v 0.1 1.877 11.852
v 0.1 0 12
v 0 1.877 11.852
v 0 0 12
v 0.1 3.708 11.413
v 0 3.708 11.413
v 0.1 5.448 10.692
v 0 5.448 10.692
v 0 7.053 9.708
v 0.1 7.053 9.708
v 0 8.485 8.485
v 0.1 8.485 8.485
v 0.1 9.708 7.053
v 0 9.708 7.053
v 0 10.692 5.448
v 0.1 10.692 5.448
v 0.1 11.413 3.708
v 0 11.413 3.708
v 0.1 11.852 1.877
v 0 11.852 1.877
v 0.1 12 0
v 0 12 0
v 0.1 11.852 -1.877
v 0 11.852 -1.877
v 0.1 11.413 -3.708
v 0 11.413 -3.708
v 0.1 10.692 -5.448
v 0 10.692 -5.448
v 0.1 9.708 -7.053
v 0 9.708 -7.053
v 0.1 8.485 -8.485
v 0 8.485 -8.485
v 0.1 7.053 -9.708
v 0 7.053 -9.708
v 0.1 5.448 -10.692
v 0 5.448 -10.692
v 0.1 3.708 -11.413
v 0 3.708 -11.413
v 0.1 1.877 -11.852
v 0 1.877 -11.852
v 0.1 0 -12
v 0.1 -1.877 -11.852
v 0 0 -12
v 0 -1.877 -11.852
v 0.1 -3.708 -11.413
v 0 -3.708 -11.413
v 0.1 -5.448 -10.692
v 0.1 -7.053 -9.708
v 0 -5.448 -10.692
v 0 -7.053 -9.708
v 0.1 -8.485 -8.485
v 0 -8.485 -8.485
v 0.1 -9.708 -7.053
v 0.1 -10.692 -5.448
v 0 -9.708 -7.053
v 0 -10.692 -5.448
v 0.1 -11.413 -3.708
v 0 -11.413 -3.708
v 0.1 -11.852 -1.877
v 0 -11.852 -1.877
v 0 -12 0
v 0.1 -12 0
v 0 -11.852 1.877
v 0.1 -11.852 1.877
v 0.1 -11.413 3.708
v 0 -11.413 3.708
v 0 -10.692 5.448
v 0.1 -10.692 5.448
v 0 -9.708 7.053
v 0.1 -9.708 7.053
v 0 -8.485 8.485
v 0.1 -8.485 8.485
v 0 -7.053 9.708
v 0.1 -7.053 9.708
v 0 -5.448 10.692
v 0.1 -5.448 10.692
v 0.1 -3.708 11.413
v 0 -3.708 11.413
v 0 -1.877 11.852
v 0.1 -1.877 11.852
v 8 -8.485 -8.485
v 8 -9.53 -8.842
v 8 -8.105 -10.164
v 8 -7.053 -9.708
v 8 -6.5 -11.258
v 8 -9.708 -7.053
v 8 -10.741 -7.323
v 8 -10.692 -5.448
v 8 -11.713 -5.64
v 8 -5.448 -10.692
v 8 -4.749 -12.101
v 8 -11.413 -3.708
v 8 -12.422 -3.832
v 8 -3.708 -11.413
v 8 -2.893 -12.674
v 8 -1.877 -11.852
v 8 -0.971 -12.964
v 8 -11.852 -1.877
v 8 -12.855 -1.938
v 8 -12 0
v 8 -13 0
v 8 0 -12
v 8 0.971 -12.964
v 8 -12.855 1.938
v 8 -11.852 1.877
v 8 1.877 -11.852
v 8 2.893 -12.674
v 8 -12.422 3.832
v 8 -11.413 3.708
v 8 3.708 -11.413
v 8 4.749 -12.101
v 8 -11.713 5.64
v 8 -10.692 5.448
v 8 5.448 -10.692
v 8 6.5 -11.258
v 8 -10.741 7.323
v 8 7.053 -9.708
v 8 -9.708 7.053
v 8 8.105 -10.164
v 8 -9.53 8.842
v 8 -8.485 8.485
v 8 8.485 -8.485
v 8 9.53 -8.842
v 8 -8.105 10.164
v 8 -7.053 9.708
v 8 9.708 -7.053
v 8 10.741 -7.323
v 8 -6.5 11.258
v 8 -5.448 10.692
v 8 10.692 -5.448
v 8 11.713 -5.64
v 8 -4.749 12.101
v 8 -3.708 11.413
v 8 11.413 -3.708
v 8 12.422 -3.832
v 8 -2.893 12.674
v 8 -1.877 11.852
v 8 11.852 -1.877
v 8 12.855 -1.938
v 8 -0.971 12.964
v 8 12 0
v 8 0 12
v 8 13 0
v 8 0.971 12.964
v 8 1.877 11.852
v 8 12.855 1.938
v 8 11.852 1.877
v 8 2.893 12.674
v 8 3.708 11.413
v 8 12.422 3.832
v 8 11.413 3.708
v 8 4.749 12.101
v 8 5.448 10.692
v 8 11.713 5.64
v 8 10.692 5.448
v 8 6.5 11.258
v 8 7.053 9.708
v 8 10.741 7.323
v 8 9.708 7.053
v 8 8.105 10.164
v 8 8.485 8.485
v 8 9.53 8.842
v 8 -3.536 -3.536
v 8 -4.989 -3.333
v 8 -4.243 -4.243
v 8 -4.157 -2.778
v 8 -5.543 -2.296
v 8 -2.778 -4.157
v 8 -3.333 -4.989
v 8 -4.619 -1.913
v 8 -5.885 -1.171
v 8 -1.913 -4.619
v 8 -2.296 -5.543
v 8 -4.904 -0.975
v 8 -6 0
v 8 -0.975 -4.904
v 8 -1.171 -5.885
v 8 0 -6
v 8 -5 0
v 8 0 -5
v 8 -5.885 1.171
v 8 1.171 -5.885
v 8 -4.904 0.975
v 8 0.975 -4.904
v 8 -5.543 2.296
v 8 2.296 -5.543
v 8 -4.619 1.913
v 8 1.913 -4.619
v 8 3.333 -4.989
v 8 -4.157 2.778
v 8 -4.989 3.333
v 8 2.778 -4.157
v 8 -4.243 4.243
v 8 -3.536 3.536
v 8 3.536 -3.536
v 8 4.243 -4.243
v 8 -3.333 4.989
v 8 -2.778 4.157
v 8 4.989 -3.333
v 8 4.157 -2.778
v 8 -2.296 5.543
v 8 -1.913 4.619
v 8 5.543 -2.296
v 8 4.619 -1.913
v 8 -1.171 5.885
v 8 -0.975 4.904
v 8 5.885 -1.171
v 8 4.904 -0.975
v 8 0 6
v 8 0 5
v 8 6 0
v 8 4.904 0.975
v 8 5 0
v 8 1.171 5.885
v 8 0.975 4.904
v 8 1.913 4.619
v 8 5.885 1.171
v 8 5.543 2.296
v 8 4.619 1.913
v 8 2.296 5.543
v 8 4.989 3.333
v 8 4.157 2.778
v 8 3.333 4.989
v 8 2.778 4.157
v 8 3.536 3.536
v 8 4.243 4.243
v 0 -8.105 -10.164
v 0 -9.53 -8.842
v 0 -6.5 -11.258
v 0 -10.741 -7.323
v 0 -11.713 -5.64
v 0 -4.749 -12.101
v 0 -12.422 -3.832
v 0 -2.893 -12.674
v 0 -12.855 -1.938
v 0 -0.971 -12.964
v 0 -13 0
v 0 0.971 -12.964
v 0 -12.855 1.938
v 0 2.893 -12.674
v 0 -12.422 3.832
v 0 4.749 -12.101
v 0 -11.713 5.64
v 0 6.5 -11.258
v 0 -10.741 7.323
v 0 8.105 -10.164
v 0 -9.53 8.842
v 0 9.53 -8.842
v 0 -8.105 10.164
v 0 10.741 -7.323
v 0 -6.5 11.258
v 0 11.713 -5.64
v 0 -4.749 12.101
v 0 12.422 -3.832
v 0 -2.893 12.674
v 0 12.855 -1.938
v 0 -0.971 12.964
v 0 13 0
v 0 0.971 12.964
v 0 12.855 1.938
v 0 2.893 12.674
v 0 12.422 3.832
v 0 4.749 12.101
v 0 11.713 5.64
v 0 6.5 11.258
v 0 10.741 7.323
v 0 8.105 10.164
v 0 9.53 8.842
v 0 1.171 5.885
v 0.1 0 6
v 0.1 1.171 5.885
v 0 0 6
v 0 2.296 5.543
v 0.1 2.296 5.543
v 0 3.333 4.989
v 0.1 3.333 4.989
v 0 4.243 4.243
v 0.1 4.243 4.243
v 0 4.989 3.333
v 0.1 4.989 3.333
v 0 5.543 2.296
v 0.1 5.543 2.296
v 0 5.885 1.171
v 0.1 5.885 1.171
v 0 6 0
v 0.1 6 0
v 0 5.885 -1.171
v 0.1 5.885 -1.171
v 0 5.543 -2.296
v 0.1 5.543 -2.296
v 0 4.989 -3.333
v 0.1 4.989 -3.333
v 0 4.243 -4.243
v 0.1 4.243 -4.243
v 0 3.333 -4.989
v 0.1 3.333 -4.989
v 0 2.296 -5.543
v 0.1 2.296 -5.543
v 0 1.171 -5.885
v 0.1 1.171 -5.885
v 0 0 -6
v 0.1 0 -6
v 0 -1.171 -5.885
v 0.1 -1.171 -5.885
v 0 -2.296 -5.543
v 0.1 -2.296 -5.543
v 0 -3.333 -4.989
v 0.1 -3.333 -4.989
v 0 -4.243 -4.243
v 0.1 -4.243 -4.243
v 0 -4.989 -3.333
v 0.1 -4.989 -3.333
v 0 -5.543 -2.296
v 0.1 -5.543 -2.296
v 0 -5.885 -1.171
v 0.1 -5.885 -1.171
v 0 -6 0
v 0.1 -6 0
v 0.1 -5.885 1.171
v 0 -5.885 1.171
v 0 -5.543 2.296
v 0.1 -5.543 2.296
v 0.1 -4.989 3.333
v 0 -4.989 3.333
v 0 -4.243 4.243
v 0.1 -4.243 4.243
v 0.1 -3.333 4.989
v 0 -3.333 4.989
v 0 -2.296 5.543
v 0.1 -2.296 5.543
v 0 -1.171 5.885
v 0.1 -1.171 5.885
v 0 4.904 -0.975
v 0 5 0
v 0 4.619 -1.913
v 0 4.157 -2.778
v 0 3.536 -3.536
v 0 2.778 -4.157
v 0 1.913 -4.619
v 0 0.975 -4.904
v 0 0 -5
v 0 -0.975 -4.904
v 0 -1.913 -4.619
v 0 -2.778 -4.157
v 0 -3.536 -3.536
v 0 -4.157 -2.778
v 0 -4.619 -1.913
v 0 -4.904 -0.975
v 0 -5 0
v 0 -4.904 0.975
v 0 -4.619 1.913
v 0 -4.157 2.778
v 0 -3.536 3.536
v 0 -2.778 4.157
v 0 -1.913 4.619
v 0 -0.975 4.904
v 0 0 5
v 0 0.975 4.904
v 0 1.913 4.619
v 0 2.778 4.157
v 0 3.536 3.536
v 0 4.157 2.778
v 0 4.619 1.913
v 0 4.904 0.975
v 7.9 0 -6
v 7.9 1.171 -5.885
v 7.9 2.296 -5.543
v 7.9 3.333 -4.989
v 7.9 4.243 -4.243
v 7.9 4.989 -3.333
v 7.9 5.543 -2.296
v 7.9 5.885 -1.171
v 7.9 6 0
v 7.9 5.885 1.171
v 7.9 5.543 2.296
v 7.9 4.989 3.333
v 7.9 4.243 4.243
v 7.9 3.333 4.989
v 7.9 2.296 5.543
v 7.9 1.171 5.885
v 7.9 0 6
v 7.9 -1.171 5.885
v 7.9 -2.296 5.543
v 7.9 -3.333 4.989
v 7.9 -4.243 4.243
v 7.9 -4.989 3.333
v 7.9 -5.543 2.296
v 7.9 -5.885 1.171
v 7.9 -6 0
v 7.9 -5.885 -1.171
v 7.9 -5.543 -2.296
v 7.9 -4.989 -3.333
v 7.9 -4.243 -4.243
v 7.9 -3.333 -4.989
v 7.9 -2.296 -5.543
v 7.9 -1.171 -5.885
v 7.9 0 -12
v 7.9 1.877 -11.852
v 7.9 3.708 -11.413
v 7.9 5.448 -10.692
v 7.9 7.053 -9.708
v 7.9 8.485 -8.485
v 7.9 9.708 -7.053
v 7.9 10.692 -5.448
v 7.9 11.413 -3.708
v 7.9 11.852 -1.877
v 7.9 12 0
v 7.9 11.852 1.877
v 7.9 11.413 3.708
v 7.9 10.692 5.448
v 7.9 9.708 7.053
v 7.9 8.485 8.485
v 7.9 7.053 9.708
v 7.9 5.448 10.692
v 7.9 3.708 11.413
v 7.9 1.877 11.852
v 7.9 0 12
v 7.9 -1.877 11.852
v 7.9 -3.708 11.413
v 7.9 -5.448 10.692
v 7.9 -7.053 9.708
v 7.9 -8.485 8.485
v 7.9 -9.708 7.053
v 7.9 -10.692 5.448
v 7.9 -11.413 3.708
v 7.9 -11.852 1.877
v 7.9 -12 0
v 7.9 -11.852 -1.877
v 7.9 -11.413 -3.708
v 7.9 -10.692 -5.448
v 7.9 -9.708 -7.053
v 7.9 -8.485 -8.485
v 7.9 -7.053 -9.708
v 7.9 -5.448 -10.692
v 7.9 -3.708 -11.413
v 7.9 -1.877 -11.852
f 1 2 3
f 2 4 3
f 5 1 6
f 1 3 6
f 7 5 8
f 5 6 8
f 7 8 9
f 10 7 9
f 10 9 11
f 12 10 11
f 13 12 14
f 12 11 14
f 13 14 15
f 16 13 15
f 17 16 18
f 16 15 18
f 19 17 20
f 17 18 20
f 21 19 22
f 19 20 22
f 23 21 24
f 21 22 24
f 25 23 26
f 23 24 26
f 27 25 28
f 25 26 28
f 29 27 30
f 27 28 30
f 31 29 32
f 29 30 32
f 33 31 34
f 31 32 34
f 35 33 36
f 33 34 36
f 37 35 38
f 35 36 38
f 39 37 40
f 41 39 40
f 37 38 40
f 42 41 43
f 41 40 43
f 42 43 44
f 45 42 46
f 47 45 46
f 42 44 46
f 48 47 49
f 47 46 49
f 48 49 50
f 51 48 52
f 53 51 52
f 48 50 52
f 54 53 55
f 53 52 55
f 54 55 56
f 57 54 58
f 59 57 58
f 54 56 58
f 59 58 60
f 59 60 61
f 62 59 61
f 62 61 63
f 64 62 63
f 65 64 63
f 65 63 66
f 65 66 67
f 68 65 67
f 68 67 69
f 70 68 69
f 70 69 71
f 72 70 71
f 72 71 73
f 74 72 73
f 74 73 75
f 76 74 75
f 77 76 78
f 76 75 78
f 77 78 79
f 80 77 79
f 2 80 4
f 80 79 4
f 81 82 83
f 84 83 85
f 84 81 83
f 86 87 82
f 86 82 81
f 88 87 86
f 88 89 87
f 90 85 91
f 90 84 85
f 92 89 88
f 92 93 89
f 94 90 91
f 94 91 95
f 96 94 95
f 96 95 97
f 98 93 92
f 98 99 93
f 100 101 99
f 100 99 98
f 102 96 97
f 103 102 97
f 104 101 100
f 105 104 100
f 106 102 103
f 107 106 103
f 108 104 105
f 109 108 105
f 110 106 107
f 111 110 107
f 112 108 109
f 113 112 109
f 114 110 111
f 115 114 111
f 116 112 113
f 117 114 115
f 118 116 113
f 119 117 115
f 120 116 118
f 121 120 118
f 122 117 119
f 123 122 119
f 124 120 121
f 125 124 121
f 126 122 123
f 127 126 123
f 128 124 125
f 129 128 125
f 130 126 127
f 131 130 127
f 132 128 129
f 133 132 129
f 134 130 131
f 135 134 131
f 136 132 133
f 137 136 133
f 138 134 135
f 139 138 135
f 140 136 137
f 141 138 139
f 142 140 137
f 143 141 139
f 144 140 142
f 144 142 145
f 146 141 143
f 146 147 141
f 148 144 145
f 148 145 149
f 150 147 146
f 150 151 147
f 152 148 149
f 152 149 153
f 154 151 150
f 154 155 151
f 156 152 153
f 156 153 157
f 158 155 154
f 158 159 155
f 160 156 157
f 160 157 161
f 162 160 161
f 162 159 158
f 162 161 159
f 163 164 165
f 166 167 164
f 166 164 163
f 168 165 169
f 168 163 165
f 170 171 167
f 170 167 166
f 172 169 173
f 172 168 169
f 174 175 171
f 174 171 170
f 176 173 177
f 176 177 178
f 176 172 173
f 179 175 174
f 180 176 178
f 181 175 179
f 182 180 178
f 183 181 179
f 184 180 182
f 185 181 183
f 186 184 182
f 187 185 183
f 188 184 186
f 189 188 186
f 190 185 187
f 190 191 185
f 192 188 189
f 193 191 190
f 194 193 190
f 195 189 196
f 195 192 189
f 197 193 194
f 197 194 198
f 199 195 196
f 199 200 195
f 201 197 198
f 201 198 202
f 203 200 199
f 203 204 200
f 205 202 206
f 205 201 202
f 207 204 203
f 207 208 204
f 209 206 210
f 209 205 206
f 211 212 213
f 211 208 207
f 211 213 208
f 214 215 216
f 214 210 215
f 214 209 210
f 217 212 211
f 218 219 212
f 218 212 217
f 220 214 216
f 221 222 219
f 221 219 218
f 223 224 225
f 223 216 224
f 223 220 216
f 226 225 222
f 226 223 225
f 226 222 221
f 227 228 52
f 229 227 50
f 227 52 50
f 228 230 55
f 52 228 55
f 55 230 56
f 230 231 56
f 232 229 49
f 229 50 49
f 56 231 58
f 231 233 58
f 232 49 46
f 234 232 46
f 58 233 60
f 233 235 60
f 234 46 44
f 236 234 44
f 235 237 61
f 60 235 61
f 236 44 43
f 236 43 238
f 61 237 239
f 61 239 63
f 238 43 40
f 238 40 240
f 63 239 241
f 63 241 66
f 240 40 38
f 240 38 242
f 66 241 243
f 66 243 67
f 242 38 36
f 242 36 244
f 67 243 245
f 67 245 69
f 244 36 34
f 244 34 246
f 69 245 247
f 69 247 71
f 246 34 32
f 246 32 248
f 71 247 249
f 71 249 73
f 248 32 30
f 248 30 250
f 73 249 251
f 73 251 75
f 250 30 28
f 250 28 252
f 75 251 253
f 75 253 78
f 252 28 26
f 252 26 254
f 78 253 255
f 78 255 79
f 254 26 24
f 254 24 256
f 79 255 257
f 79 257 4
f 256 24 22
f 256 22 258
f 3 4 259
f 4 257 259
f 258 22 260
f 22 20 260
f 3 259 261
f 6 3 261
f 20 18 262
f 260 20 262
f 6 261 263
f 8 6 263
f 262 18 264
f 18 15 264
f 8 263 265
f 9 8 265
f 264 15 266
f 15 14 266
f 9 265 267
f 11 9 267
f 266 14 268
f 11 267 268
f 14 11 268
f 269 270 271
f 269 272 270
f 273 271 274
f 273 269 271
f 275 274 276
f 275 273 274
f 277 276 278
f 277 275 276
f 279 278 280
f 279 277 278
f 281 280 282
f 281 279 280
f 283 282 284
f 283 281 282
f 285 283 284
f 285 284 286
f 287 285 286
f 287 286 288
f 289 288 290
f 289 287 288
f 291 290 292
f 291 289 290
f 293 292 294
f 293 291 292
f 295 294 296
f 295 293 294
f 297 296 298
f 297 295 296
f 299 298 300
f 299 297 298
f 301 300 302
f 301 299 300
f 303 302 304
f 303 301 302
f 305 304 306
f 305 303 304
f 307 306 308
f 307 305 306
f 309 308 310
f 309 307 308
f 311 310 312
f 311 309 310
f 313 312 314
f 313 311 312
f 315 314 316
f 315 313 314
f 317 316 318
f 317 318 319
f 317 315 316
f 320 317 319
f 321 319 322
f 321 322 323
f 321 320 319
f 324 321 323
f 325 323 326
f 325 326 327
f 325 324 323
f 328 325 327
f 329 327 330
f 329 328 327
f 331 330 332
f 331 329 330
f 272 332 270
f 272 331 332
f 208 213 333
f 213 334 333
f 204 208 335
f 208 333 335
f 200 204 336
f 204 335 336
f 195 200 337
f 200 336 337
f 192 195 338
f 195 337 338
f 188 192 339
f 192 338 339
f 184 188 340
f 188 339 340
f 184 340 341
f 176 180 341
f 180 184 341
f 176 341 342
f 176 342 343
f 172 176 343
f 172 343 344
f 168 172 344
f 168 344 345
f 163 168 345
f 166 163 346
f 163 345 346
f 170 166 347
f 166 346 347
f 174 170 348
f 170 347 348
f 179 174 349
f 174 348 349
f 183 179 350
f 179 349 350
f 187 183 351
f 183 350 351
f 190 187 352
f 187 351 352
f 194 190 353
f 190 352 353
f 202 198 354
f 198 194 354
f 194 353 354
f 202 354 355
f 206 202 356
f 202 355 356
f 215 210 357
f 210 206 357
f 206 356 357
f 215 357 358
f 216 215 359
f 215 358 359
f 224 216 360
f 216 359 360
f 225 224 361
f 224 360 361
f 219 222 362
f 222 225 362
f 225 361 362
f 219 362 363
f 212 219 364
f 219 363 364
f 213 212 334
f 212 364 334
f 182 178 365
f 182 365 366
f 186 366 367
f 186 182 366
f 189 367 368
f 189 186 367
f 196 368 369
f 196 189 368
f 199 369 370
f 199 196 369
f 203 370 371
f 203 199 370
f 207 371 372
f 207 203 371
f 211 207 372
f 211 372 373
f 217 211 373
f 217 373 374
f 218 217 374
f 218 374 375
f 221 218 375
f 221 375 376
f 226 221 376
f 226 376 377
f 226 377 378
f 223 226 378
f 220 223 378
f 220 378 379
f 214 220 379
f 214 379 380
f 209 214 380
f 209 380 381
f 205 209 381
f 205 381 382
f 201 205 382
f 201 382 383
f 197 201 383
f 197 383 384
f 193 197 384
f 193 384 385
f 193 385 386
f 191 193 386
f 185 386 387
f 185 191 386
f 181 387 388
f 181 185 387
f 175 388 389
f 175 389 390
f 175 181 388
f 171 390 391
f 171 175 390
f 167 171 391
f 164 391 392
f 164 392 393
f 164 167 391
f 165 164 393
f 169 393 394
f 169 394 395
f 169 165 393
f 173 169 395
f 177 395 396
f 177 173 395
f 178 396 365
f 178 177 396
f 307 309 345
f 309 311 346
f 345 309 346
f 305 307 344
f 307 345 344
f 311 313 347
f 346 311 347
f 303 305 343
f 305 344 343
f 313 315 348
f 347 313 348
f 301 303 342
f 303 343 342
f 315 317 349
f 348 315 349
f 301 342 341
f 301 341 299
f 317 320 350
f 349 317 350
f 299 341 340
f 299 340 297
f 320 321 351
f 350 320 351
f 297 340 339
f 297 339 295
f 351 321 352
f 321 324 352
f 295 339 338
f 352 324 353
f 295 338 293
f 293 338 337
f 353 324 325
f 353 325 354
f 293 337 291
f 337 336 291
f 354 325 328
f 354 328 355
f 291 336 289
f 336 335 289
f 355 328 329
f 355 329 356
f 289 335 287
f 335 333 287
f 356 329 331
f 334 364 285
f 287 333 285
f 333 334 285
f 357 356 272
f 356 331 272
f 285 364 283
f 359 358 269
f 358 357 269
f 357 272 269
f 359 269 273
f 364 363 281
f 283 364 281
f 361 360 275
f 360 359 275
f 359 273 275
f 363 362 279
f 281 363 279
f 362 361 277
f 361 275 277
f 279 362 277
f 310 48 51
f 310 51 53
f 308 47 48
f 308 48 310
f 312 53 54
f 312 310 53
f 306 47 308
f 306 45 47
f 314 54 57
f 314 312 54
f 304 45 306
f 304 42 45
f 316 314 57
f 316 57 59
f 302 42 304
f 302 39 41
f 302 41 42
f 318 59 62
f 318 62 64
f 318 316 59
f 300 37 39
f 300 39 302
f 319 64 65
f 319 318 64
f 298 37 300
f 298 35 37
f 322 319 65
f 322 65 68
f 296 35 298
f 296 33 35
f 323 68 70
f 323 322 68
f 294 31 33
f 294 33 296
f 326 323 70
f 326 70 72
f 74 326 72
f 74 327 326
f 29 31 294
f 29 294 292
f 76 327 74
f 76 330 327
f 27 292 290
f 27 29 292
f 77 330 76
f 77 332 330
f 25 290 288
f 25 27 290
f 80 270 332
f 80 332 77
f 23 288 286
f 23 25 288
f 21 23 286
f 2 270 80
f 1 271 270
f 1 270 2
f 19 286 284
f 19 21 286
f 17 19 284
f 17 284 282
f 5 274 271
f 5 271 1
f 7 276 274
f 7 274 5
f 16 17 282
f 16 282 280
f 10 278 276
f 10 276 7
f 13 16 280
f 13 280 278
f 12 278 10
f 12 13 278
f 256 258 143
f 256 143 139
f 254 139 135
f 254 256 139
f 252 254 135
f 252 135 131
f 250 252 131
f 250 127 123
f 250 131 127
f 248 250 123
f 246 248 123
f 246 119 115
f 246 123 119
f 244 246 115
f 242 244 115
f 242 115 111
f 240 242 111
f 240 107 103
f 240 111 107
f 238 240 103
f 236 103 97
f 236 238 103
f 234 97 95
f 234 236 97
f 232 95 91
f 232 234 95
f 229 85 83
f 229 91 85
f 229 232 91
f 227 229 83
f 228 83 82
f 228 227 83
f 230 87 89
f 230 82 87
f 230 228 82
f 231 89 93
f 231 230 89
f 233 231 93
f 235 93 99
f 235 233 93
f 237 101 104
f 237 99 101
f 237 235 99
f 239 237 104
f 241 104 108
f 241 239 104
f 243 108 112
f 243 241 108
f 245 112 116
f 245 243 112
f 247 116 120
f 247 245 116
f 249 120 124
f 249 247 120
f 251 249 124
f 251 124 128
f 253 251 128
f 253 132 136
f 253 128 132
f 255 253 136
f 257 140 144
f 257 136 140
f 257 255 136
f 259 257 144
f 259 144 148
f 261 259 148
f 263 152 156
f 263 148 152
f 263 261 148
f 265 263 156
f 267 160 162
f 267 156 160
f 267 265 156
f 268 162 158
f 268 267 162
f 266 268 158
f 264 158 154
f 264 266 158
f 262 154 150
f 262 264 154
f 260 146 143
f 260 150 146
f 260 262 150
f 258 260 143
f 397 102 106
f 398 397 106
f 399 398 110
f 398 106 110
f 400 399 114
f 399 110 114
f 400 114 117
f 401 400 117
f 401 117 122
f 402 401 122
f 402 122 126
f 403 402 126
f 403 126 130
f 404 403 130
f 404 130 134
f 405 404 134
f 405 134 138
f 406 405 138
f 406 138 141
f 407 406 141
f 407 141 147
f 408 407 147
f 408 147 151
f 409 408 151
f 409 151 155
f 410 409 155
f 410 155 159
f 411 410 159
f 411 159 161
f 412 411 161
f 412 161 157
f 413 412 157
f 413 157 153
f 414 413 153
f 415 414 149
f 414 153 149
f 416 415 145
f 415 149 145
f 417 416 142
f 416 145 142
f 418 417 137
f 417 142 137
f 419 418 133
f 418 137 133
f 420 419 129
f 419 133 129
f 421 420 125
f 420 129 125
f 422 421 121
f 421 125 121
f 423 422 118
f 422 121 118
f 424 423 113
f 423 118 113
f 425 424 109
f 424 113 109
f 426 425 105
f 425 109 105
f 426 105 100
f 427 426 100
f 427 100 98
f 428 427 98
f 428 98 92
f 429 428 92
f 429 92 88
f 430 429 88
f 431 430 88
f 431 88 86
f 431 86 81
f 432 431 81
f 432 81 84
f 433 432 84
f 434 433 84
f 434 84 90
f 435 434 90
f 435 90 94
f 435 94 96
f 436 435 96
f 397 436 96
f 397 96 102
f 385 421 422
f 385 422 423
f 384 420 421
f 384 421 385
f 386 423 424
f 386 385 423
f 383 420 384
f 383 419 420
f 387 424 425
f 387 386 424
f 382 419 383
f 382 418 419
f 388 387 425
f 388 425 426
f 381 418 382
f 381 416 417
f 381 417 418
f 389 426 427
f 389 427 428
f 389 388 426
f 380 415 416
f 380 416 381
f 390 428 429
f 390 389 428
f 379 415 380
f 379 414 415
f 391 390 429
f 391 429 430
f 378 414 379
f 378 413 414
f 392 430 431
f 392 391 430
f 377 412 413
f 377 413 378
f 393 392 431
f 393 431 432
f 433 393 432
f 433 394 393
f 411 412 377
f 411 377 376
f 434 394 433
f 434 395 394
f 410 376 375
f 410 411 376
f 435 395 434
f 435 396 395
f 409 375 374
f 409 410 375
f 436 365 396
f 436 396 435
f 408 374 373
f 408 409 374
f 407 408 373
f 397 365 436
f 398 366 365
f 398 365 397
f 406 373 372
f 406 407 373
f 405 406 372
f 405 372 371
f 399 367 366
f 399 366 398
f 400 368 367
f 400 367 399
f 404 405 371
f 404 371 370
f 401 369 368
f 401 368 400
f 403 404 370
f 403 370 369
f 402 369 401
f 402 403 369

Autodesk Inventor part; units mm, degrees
ref_plane "YZ Plane" through (0, 0, 0) normal (1, 0, 0) x (0, 1, 0)
ref_plane "XZ Plane" through (0, 0, 0) normal (0, 1, 0) x (-1, 0, 0)
ref_plane "XY Plane" through (0, 0, 0) normal (0, 0, 1) x (1, 0, 0)
sketch "スケッチ1" plane through (0, 0, 0) normal (1, 0, 0) x (0, 1, 0)
  circle A0 centre (0, 0) radius 5
  circle A1 centre (0, 0) radius 13
  dimension "d0" = 10
  dimension "d1" = 26
extrude "押し出し1" add sketch "スケッチ1" along normal blind 8
sketch "スケッチ2" plane through (8, 0, 0) normal (1, 0, 0) x (0, 0, -1)
  circle A0 centre (0, 0) radius 6
  circle A1 centre (0, 0) radius 12
  dimension "d4" = 12
  dimension "d5" = 24
extrude "押し出し2" cut sketch "スケッチ2" against normal blind 0.1
sketch "スケッチ3" plane through (0, 0, 0) normal (-1, 0, 0) x (0, 0, 1)
  circle A0 centre (0, 0) radius 6
  circle A1 centre (0, 0) radius 12
  dimension "d8" = 12
  dimension "d9" = 24
extrude "押し出し3" cut sketch "スケッチ3" against normal blind 0.1
properties part number "Bearing_6000ZZ" material "鋼、炭素鋼"
